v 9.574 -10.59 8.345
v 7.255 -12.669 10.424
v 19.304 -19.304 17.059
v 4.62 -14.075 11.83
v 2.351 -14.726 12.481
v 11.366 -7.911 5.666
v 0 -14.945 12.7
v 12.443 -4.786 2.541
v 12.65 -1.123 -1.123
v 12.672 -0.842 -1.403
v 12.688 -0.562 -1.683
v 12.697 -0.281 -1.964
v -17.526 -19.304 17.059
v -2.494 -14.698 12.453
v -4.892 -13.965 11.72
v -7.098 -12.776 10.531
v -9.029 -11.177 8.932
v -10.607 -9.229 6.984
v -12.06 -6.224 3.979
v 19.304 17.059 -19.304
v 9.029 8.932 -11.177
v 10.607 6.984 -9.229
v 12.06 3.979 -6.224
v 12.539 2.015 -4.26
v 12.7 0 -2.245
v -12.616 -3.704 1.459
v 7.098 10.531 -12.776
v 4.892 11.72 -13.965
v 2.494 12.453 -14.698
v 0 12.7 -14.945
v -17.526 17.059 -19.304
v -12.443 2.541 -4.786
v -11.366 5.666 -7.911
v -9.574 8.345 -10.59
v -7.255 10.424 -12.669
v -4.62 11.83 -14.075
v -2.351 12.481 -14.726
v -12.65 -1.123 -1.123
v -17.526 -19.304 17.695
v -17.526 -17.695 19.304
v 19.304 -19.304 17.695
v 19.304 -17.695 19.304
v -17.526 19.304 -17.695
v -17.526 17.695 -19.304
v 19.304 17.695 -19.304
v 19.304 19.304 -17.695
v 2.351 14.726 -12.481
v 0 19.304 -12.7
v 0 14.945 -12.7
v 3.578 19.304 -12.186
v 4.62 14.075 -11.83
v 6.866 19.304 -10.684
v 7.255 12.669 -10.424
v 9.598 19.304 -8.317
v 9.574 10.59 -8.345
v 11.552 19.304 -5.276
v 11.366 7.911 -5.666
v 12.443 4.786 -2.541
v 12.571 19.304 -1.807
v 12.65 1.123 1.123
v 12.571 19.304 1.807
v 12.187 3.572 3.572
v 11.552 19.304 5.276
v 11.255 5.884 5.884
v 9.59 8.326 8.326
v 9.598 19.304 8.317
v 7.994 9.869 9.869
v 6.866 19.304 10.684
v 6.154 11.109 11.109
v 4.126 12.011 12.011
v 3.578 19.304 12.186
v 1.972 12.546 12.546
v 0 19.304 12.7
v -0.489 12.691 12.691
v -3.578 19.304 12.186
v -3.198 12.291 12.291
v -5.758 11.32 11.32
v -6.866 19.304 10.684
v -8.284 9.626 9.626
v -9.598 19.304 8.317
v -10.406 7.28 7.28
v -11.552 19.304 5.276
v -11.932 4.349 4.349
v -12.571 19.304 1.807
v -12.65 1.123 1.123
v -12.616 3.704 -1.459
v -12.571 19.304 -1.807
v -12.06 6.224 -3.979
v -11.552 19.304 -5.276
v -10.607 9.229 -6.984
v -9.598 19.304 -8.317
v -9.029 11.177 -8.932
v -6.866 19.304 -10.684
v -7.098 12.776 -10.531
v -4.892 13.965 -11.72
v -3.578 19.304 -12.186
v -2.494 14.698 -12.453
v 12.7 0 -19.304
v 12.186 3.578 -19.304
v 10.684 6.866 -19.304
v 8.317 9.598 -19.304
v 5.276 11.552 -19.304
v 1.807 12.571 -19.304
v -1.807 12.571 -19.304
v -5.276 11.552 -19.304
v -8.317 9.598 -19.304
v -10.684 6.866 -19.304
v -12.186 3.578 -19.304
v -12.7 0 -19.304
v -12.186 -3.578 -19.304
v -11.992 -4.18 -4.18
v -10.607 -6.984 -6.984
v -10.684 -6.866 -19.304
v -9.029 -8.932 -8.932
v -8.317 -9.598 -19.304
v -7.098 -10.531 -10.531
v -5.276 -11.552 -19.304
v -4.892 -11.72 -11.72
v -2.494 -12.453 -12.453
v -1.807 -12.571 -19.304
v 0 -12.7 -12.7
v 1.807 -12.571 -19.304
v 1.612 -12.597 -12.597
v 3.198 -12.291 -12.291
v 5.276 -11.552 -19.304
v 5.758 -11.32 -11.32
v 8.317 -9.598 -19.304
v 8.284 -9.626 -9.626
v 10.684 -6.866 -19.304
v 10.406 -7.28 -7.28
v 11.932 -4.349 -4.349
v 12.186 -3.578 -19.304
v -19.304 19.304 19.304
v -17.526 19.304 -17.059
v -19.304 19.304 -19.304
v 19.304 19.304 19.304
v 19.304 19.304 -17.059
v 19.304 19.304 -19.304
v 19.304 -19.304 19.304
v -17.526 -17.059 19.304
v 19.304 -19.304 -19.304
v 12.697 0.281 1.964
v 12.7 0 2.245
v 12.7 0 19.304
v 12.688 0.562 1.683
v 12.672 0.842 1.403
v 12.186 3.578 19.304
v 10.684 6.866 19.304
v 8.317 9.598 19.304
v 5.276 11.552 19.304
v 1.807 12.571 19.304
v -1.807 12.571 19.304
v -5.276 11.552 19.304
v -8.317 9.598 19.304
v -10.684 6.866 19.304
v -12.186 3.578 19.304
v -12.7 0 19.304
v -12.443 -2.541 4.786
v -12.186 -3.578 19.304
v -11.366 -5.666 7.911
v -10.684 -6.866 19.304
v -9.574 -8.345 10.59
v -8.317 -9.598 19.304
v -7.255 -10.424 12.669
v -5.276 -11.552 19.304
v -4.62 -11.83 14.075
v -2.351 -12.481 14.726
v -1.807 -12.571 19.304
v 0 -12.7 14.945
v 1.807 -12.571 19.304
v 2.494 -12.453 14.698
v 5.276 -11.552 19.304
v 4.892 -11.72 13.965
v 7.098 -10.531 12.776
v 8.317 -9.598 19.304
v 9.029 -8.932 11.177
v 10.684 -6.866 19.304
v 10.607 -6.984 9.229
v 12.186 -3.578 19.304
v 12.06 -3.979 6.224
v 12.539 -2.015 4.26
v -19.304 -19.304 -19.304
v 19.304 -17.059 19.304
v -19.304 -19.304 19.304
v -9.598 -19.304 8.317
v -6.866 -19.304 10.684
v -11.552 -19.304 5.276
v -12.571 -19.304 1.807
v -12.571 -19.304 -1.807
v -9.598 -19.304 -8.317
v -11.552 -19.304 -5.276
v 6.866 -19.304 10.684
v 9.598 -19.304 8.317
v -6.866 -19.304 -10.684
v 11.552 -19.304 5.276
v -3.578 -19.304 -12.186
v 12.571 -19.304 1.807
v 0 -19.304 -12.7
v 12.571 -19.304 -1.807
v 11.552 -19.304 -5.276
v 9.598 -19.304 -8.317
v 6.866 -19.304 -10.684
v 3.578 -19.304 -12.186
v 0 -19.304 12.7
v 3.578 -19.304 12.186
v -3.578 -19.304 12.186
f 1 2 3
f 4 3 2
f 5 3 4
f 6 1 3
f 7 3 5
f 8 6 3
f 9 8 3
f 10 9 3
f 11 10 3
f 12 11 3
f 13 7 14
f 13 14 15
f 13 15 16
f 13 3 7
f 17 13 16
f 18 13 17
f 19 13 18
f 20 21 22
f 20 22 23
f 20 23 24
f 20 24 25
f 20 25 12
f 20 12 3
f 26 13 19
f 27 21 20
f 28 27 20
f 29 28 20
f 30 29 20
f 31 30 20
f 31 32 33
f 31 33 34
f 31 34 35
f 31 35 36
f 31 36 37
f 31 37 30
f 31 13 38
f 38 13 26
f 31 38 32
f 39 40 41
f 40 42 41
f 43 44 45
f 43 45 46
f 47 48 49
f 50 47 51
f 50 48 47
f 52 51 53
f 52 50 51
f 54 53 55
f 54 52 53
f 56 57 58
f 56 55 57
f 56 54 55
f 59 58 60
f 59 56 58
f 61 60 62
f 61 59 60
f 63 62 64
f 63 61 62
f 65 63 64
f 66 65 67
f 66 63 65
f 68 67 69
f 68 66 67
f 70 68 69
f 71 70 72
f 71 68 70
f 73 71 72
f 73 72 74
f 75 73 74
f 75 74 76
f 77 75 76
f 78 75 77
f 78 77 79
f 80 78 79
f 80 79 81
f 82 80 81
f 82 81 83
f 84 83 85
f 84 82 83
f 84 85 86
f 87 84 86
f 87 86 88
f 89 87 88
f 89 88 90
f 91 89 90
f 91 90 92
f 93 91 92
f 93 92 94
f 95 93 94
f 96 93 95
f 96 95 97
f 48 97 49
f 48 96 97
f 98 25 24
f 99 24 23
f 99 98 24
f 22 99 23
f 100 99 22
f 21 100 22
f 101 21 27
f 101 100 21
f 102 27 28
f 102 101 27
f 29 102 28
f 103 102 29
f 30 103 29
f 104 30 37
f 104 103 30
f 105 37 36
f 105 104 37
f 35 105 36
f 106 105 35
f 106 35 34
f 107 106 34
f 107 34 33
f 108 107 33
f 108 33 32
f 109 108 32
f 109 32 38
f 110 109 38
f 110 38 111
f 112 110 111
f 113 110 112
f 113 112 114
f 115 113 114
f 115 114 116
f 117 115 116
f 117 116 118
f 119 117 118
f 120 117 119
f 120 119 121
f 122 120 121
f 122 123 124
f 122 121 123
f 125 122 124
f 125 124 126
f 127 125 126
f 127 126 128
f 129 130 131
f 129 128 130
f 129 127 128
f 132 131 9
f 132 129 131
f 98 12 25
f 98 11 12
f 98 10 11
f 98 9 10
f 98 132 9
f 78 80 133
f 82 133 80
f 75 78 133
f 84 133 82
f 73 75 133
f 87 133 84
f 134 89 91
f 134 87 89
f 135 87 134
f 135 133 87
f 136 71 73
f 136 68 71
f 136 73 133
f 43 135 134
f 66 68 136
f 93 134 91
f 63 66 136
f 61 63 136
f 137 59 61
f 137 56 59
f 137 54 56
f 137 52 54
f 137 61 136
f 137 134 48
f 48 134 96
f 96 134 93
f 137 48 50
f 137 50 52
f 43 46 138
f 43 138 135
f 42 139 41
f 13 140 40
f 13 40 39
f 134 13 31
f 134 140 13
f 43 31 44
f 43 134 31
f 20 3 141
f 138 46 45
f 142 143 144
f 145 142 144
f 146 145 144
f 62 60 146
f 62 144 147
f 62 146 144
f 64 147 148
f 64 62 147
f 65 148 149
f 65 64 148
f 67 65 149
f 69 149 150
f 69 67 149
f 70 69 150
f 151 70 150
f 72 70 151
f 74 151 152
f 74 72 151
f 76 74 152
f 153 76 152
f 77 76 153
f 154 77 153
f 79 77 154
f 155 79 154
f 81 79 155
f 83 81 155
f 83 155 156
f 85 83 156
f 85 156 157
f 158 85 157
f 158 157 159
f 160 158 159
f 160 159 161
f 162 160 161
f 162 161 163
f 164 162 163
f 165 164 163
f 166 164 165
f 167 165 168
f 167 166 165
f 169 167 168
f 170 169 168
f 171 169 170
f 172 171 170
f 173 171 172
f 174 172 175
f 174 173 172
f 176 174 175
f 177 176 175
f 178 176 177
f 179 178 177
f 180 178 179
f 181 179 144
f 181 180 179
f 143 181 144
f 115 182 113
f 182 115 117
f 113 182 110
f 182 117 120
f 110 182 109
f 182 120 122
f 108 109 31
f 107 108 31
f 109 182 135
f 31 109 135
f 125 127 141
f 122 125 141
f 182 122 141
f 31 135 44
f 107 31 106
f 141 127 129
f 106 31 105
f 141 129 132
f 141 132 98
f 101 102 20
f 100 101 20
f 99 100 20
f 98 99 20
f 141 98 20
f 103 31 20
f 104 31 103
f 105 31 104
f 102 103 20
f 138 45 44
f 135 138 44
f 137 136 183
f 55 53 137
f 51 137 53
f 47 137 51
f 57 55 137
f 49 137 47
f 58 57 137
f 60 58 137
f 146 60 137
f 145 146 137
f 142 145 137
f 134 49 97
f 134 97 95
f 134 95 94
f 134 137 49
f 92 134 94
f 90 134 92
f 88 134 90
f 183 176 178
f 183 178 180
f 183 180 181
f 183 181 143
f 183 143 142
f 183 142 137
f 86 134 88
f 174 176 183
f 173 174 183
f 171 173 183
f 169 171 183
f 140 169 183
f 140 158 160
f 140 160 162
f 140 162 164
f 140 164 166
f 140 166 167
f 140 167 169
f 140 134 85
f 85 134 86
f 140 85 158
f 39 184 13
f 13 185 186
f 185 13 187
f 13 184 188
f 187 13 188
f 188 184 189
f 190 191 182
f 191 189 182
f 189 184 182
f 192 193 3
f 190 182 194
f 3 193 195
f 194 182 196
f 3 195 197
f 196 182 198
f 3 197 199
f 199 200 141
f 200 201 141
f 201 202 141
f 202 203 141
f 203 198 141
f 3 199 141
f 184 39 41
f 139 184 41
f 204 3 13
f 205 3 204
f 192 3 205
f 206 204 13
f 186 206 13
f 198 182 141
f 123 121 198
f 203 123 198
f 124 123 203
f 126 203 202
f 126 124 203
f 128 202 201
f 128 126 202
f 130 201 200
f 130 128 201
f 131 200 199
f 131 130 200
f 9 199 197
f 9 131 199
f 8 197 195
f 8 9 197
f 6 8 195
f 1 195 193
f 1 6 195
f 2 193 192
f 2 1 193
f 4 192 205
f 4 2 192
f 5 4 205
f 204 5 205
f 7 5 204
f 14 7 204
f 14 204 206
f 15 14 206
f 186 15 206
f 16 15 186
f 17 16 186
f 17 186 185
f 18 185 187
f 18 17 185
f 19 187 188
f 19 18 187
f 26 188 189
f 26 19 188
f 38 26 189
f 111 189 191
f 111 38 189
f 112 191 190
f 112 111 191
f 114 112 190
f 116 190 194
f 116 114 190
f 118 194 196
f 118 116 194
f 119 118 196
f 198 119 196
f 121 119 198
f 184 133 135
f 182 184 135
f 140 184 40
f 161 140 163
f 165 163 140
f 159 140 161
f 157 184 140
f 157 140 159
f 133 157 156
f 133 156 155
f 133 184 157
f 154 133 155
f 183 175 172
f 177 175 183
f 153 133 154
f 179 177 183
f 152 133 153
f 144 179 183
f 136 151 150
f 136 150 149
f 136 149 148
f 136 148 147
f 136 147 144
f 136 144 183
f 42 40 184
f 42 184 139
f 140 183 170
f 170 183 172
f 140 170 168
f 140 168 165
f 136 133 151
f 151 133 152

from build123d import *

# Parameters (mm, degrees)
SKETCH1_W               = 38.608
SKETCH1_H               = 38.608
BOSS_EXTRUDE1_DEPTH     = 19.304
CUT_EXTRUDE1_DEPTH      = 34.435508789
CUT_EXTRUDE1_DEPTH_BACK = 34.435508789
SKETCH2_R               = 12.7
CUT_EXTRUDE3_DEPTH      = 48.284949995
CUT_EXTRUDE3_DEPTH_BACK = 48.284949995
SKETCH3_R               = 12.7
CUT_EXTRUDE4_DEPTH      = 17.526
CUT_EXTRUDE5_DEPTH      = 34.435508789


with BuildPart() as part:
    # Sketch1 → Boss-Extrude1 (new, symmetric)
    with BuildSketch(Plane(origin=(0, 0, 0), x_dir=(1, 0, 0), z_dir=(0, 1, 0))):
        Rectangle(SKETCH1_W, SKETCH1_H)
    extrude(amount=BOSS_EXTRUDE1_DEPTH, both=True)

    # Sketch2 → Cut-Extrude1 (cut, two sides: drawn at the far end of the back side and taken through both)
    with BuildSketch(Plane.XY.offset(-CUT_EXTRUDE1_DEPTH_BACK)):
        Circle(SKETCH2_R)
    extrude(amount=CUT_EXTRUDE1_DEPTH + CUT_EXTRUDE1_DEPTH_BACK, mode=Mode.SUBTRACT)

    # Sketch3 → Cut-Extrude3 (cut, two sides: drawn at the far end of the back side and taken through both)
    with BuildSketch(Plane(origin=(0, 19.304, 0), x_dir=(0, 0, -1), z_dir=(0, -1, 0)).offset(-CUT_EXTRUDE3_DEPTH_BACK)):
        Circle(SKETCH3_R)
    extrude(amount=CUT_EXTRUDE3_DEPTH + CUT_EXTRUDE3_DEPTH_BACK, mode=Mode.SUBTRACT)

    # Sketch4 → Cut-Extrude4 (cut, symmetric)
    with BuildSketch(Plane(origin=(0, 0, 0), x_dir=(0, 0, -1), z_dir=(1, 0, 0))):
        Polygon((-17.376795594, -19.621859625), (19.621859625, 17.376795594), (17.376795594, 19.621859625), (-19.621859625, -17.376795594), align=None)
    extrude(amount=CUT_EXTRUDE4_DEPTH, both=True, mode=Mode.SUBTRACT)

    # Sketch4<2> → Cut-Extrude5 (cut, through all)
    with BuildSketch(Plane(origin=(0, 0, 0), x_dir=(0, 0, -1), z_dir=(1, 0, 0))):
        Polygon((-17.376795594, -19.621859625), (19.621859625, 17.376795594), (17.376795594, 19.621859625), (-19.621859625, -17.376795594), align=None)
    extrude(amount=CUT_EXTRUDE5_DEPTH, mode=Mode.SUBTRACT)


solid = part.part
